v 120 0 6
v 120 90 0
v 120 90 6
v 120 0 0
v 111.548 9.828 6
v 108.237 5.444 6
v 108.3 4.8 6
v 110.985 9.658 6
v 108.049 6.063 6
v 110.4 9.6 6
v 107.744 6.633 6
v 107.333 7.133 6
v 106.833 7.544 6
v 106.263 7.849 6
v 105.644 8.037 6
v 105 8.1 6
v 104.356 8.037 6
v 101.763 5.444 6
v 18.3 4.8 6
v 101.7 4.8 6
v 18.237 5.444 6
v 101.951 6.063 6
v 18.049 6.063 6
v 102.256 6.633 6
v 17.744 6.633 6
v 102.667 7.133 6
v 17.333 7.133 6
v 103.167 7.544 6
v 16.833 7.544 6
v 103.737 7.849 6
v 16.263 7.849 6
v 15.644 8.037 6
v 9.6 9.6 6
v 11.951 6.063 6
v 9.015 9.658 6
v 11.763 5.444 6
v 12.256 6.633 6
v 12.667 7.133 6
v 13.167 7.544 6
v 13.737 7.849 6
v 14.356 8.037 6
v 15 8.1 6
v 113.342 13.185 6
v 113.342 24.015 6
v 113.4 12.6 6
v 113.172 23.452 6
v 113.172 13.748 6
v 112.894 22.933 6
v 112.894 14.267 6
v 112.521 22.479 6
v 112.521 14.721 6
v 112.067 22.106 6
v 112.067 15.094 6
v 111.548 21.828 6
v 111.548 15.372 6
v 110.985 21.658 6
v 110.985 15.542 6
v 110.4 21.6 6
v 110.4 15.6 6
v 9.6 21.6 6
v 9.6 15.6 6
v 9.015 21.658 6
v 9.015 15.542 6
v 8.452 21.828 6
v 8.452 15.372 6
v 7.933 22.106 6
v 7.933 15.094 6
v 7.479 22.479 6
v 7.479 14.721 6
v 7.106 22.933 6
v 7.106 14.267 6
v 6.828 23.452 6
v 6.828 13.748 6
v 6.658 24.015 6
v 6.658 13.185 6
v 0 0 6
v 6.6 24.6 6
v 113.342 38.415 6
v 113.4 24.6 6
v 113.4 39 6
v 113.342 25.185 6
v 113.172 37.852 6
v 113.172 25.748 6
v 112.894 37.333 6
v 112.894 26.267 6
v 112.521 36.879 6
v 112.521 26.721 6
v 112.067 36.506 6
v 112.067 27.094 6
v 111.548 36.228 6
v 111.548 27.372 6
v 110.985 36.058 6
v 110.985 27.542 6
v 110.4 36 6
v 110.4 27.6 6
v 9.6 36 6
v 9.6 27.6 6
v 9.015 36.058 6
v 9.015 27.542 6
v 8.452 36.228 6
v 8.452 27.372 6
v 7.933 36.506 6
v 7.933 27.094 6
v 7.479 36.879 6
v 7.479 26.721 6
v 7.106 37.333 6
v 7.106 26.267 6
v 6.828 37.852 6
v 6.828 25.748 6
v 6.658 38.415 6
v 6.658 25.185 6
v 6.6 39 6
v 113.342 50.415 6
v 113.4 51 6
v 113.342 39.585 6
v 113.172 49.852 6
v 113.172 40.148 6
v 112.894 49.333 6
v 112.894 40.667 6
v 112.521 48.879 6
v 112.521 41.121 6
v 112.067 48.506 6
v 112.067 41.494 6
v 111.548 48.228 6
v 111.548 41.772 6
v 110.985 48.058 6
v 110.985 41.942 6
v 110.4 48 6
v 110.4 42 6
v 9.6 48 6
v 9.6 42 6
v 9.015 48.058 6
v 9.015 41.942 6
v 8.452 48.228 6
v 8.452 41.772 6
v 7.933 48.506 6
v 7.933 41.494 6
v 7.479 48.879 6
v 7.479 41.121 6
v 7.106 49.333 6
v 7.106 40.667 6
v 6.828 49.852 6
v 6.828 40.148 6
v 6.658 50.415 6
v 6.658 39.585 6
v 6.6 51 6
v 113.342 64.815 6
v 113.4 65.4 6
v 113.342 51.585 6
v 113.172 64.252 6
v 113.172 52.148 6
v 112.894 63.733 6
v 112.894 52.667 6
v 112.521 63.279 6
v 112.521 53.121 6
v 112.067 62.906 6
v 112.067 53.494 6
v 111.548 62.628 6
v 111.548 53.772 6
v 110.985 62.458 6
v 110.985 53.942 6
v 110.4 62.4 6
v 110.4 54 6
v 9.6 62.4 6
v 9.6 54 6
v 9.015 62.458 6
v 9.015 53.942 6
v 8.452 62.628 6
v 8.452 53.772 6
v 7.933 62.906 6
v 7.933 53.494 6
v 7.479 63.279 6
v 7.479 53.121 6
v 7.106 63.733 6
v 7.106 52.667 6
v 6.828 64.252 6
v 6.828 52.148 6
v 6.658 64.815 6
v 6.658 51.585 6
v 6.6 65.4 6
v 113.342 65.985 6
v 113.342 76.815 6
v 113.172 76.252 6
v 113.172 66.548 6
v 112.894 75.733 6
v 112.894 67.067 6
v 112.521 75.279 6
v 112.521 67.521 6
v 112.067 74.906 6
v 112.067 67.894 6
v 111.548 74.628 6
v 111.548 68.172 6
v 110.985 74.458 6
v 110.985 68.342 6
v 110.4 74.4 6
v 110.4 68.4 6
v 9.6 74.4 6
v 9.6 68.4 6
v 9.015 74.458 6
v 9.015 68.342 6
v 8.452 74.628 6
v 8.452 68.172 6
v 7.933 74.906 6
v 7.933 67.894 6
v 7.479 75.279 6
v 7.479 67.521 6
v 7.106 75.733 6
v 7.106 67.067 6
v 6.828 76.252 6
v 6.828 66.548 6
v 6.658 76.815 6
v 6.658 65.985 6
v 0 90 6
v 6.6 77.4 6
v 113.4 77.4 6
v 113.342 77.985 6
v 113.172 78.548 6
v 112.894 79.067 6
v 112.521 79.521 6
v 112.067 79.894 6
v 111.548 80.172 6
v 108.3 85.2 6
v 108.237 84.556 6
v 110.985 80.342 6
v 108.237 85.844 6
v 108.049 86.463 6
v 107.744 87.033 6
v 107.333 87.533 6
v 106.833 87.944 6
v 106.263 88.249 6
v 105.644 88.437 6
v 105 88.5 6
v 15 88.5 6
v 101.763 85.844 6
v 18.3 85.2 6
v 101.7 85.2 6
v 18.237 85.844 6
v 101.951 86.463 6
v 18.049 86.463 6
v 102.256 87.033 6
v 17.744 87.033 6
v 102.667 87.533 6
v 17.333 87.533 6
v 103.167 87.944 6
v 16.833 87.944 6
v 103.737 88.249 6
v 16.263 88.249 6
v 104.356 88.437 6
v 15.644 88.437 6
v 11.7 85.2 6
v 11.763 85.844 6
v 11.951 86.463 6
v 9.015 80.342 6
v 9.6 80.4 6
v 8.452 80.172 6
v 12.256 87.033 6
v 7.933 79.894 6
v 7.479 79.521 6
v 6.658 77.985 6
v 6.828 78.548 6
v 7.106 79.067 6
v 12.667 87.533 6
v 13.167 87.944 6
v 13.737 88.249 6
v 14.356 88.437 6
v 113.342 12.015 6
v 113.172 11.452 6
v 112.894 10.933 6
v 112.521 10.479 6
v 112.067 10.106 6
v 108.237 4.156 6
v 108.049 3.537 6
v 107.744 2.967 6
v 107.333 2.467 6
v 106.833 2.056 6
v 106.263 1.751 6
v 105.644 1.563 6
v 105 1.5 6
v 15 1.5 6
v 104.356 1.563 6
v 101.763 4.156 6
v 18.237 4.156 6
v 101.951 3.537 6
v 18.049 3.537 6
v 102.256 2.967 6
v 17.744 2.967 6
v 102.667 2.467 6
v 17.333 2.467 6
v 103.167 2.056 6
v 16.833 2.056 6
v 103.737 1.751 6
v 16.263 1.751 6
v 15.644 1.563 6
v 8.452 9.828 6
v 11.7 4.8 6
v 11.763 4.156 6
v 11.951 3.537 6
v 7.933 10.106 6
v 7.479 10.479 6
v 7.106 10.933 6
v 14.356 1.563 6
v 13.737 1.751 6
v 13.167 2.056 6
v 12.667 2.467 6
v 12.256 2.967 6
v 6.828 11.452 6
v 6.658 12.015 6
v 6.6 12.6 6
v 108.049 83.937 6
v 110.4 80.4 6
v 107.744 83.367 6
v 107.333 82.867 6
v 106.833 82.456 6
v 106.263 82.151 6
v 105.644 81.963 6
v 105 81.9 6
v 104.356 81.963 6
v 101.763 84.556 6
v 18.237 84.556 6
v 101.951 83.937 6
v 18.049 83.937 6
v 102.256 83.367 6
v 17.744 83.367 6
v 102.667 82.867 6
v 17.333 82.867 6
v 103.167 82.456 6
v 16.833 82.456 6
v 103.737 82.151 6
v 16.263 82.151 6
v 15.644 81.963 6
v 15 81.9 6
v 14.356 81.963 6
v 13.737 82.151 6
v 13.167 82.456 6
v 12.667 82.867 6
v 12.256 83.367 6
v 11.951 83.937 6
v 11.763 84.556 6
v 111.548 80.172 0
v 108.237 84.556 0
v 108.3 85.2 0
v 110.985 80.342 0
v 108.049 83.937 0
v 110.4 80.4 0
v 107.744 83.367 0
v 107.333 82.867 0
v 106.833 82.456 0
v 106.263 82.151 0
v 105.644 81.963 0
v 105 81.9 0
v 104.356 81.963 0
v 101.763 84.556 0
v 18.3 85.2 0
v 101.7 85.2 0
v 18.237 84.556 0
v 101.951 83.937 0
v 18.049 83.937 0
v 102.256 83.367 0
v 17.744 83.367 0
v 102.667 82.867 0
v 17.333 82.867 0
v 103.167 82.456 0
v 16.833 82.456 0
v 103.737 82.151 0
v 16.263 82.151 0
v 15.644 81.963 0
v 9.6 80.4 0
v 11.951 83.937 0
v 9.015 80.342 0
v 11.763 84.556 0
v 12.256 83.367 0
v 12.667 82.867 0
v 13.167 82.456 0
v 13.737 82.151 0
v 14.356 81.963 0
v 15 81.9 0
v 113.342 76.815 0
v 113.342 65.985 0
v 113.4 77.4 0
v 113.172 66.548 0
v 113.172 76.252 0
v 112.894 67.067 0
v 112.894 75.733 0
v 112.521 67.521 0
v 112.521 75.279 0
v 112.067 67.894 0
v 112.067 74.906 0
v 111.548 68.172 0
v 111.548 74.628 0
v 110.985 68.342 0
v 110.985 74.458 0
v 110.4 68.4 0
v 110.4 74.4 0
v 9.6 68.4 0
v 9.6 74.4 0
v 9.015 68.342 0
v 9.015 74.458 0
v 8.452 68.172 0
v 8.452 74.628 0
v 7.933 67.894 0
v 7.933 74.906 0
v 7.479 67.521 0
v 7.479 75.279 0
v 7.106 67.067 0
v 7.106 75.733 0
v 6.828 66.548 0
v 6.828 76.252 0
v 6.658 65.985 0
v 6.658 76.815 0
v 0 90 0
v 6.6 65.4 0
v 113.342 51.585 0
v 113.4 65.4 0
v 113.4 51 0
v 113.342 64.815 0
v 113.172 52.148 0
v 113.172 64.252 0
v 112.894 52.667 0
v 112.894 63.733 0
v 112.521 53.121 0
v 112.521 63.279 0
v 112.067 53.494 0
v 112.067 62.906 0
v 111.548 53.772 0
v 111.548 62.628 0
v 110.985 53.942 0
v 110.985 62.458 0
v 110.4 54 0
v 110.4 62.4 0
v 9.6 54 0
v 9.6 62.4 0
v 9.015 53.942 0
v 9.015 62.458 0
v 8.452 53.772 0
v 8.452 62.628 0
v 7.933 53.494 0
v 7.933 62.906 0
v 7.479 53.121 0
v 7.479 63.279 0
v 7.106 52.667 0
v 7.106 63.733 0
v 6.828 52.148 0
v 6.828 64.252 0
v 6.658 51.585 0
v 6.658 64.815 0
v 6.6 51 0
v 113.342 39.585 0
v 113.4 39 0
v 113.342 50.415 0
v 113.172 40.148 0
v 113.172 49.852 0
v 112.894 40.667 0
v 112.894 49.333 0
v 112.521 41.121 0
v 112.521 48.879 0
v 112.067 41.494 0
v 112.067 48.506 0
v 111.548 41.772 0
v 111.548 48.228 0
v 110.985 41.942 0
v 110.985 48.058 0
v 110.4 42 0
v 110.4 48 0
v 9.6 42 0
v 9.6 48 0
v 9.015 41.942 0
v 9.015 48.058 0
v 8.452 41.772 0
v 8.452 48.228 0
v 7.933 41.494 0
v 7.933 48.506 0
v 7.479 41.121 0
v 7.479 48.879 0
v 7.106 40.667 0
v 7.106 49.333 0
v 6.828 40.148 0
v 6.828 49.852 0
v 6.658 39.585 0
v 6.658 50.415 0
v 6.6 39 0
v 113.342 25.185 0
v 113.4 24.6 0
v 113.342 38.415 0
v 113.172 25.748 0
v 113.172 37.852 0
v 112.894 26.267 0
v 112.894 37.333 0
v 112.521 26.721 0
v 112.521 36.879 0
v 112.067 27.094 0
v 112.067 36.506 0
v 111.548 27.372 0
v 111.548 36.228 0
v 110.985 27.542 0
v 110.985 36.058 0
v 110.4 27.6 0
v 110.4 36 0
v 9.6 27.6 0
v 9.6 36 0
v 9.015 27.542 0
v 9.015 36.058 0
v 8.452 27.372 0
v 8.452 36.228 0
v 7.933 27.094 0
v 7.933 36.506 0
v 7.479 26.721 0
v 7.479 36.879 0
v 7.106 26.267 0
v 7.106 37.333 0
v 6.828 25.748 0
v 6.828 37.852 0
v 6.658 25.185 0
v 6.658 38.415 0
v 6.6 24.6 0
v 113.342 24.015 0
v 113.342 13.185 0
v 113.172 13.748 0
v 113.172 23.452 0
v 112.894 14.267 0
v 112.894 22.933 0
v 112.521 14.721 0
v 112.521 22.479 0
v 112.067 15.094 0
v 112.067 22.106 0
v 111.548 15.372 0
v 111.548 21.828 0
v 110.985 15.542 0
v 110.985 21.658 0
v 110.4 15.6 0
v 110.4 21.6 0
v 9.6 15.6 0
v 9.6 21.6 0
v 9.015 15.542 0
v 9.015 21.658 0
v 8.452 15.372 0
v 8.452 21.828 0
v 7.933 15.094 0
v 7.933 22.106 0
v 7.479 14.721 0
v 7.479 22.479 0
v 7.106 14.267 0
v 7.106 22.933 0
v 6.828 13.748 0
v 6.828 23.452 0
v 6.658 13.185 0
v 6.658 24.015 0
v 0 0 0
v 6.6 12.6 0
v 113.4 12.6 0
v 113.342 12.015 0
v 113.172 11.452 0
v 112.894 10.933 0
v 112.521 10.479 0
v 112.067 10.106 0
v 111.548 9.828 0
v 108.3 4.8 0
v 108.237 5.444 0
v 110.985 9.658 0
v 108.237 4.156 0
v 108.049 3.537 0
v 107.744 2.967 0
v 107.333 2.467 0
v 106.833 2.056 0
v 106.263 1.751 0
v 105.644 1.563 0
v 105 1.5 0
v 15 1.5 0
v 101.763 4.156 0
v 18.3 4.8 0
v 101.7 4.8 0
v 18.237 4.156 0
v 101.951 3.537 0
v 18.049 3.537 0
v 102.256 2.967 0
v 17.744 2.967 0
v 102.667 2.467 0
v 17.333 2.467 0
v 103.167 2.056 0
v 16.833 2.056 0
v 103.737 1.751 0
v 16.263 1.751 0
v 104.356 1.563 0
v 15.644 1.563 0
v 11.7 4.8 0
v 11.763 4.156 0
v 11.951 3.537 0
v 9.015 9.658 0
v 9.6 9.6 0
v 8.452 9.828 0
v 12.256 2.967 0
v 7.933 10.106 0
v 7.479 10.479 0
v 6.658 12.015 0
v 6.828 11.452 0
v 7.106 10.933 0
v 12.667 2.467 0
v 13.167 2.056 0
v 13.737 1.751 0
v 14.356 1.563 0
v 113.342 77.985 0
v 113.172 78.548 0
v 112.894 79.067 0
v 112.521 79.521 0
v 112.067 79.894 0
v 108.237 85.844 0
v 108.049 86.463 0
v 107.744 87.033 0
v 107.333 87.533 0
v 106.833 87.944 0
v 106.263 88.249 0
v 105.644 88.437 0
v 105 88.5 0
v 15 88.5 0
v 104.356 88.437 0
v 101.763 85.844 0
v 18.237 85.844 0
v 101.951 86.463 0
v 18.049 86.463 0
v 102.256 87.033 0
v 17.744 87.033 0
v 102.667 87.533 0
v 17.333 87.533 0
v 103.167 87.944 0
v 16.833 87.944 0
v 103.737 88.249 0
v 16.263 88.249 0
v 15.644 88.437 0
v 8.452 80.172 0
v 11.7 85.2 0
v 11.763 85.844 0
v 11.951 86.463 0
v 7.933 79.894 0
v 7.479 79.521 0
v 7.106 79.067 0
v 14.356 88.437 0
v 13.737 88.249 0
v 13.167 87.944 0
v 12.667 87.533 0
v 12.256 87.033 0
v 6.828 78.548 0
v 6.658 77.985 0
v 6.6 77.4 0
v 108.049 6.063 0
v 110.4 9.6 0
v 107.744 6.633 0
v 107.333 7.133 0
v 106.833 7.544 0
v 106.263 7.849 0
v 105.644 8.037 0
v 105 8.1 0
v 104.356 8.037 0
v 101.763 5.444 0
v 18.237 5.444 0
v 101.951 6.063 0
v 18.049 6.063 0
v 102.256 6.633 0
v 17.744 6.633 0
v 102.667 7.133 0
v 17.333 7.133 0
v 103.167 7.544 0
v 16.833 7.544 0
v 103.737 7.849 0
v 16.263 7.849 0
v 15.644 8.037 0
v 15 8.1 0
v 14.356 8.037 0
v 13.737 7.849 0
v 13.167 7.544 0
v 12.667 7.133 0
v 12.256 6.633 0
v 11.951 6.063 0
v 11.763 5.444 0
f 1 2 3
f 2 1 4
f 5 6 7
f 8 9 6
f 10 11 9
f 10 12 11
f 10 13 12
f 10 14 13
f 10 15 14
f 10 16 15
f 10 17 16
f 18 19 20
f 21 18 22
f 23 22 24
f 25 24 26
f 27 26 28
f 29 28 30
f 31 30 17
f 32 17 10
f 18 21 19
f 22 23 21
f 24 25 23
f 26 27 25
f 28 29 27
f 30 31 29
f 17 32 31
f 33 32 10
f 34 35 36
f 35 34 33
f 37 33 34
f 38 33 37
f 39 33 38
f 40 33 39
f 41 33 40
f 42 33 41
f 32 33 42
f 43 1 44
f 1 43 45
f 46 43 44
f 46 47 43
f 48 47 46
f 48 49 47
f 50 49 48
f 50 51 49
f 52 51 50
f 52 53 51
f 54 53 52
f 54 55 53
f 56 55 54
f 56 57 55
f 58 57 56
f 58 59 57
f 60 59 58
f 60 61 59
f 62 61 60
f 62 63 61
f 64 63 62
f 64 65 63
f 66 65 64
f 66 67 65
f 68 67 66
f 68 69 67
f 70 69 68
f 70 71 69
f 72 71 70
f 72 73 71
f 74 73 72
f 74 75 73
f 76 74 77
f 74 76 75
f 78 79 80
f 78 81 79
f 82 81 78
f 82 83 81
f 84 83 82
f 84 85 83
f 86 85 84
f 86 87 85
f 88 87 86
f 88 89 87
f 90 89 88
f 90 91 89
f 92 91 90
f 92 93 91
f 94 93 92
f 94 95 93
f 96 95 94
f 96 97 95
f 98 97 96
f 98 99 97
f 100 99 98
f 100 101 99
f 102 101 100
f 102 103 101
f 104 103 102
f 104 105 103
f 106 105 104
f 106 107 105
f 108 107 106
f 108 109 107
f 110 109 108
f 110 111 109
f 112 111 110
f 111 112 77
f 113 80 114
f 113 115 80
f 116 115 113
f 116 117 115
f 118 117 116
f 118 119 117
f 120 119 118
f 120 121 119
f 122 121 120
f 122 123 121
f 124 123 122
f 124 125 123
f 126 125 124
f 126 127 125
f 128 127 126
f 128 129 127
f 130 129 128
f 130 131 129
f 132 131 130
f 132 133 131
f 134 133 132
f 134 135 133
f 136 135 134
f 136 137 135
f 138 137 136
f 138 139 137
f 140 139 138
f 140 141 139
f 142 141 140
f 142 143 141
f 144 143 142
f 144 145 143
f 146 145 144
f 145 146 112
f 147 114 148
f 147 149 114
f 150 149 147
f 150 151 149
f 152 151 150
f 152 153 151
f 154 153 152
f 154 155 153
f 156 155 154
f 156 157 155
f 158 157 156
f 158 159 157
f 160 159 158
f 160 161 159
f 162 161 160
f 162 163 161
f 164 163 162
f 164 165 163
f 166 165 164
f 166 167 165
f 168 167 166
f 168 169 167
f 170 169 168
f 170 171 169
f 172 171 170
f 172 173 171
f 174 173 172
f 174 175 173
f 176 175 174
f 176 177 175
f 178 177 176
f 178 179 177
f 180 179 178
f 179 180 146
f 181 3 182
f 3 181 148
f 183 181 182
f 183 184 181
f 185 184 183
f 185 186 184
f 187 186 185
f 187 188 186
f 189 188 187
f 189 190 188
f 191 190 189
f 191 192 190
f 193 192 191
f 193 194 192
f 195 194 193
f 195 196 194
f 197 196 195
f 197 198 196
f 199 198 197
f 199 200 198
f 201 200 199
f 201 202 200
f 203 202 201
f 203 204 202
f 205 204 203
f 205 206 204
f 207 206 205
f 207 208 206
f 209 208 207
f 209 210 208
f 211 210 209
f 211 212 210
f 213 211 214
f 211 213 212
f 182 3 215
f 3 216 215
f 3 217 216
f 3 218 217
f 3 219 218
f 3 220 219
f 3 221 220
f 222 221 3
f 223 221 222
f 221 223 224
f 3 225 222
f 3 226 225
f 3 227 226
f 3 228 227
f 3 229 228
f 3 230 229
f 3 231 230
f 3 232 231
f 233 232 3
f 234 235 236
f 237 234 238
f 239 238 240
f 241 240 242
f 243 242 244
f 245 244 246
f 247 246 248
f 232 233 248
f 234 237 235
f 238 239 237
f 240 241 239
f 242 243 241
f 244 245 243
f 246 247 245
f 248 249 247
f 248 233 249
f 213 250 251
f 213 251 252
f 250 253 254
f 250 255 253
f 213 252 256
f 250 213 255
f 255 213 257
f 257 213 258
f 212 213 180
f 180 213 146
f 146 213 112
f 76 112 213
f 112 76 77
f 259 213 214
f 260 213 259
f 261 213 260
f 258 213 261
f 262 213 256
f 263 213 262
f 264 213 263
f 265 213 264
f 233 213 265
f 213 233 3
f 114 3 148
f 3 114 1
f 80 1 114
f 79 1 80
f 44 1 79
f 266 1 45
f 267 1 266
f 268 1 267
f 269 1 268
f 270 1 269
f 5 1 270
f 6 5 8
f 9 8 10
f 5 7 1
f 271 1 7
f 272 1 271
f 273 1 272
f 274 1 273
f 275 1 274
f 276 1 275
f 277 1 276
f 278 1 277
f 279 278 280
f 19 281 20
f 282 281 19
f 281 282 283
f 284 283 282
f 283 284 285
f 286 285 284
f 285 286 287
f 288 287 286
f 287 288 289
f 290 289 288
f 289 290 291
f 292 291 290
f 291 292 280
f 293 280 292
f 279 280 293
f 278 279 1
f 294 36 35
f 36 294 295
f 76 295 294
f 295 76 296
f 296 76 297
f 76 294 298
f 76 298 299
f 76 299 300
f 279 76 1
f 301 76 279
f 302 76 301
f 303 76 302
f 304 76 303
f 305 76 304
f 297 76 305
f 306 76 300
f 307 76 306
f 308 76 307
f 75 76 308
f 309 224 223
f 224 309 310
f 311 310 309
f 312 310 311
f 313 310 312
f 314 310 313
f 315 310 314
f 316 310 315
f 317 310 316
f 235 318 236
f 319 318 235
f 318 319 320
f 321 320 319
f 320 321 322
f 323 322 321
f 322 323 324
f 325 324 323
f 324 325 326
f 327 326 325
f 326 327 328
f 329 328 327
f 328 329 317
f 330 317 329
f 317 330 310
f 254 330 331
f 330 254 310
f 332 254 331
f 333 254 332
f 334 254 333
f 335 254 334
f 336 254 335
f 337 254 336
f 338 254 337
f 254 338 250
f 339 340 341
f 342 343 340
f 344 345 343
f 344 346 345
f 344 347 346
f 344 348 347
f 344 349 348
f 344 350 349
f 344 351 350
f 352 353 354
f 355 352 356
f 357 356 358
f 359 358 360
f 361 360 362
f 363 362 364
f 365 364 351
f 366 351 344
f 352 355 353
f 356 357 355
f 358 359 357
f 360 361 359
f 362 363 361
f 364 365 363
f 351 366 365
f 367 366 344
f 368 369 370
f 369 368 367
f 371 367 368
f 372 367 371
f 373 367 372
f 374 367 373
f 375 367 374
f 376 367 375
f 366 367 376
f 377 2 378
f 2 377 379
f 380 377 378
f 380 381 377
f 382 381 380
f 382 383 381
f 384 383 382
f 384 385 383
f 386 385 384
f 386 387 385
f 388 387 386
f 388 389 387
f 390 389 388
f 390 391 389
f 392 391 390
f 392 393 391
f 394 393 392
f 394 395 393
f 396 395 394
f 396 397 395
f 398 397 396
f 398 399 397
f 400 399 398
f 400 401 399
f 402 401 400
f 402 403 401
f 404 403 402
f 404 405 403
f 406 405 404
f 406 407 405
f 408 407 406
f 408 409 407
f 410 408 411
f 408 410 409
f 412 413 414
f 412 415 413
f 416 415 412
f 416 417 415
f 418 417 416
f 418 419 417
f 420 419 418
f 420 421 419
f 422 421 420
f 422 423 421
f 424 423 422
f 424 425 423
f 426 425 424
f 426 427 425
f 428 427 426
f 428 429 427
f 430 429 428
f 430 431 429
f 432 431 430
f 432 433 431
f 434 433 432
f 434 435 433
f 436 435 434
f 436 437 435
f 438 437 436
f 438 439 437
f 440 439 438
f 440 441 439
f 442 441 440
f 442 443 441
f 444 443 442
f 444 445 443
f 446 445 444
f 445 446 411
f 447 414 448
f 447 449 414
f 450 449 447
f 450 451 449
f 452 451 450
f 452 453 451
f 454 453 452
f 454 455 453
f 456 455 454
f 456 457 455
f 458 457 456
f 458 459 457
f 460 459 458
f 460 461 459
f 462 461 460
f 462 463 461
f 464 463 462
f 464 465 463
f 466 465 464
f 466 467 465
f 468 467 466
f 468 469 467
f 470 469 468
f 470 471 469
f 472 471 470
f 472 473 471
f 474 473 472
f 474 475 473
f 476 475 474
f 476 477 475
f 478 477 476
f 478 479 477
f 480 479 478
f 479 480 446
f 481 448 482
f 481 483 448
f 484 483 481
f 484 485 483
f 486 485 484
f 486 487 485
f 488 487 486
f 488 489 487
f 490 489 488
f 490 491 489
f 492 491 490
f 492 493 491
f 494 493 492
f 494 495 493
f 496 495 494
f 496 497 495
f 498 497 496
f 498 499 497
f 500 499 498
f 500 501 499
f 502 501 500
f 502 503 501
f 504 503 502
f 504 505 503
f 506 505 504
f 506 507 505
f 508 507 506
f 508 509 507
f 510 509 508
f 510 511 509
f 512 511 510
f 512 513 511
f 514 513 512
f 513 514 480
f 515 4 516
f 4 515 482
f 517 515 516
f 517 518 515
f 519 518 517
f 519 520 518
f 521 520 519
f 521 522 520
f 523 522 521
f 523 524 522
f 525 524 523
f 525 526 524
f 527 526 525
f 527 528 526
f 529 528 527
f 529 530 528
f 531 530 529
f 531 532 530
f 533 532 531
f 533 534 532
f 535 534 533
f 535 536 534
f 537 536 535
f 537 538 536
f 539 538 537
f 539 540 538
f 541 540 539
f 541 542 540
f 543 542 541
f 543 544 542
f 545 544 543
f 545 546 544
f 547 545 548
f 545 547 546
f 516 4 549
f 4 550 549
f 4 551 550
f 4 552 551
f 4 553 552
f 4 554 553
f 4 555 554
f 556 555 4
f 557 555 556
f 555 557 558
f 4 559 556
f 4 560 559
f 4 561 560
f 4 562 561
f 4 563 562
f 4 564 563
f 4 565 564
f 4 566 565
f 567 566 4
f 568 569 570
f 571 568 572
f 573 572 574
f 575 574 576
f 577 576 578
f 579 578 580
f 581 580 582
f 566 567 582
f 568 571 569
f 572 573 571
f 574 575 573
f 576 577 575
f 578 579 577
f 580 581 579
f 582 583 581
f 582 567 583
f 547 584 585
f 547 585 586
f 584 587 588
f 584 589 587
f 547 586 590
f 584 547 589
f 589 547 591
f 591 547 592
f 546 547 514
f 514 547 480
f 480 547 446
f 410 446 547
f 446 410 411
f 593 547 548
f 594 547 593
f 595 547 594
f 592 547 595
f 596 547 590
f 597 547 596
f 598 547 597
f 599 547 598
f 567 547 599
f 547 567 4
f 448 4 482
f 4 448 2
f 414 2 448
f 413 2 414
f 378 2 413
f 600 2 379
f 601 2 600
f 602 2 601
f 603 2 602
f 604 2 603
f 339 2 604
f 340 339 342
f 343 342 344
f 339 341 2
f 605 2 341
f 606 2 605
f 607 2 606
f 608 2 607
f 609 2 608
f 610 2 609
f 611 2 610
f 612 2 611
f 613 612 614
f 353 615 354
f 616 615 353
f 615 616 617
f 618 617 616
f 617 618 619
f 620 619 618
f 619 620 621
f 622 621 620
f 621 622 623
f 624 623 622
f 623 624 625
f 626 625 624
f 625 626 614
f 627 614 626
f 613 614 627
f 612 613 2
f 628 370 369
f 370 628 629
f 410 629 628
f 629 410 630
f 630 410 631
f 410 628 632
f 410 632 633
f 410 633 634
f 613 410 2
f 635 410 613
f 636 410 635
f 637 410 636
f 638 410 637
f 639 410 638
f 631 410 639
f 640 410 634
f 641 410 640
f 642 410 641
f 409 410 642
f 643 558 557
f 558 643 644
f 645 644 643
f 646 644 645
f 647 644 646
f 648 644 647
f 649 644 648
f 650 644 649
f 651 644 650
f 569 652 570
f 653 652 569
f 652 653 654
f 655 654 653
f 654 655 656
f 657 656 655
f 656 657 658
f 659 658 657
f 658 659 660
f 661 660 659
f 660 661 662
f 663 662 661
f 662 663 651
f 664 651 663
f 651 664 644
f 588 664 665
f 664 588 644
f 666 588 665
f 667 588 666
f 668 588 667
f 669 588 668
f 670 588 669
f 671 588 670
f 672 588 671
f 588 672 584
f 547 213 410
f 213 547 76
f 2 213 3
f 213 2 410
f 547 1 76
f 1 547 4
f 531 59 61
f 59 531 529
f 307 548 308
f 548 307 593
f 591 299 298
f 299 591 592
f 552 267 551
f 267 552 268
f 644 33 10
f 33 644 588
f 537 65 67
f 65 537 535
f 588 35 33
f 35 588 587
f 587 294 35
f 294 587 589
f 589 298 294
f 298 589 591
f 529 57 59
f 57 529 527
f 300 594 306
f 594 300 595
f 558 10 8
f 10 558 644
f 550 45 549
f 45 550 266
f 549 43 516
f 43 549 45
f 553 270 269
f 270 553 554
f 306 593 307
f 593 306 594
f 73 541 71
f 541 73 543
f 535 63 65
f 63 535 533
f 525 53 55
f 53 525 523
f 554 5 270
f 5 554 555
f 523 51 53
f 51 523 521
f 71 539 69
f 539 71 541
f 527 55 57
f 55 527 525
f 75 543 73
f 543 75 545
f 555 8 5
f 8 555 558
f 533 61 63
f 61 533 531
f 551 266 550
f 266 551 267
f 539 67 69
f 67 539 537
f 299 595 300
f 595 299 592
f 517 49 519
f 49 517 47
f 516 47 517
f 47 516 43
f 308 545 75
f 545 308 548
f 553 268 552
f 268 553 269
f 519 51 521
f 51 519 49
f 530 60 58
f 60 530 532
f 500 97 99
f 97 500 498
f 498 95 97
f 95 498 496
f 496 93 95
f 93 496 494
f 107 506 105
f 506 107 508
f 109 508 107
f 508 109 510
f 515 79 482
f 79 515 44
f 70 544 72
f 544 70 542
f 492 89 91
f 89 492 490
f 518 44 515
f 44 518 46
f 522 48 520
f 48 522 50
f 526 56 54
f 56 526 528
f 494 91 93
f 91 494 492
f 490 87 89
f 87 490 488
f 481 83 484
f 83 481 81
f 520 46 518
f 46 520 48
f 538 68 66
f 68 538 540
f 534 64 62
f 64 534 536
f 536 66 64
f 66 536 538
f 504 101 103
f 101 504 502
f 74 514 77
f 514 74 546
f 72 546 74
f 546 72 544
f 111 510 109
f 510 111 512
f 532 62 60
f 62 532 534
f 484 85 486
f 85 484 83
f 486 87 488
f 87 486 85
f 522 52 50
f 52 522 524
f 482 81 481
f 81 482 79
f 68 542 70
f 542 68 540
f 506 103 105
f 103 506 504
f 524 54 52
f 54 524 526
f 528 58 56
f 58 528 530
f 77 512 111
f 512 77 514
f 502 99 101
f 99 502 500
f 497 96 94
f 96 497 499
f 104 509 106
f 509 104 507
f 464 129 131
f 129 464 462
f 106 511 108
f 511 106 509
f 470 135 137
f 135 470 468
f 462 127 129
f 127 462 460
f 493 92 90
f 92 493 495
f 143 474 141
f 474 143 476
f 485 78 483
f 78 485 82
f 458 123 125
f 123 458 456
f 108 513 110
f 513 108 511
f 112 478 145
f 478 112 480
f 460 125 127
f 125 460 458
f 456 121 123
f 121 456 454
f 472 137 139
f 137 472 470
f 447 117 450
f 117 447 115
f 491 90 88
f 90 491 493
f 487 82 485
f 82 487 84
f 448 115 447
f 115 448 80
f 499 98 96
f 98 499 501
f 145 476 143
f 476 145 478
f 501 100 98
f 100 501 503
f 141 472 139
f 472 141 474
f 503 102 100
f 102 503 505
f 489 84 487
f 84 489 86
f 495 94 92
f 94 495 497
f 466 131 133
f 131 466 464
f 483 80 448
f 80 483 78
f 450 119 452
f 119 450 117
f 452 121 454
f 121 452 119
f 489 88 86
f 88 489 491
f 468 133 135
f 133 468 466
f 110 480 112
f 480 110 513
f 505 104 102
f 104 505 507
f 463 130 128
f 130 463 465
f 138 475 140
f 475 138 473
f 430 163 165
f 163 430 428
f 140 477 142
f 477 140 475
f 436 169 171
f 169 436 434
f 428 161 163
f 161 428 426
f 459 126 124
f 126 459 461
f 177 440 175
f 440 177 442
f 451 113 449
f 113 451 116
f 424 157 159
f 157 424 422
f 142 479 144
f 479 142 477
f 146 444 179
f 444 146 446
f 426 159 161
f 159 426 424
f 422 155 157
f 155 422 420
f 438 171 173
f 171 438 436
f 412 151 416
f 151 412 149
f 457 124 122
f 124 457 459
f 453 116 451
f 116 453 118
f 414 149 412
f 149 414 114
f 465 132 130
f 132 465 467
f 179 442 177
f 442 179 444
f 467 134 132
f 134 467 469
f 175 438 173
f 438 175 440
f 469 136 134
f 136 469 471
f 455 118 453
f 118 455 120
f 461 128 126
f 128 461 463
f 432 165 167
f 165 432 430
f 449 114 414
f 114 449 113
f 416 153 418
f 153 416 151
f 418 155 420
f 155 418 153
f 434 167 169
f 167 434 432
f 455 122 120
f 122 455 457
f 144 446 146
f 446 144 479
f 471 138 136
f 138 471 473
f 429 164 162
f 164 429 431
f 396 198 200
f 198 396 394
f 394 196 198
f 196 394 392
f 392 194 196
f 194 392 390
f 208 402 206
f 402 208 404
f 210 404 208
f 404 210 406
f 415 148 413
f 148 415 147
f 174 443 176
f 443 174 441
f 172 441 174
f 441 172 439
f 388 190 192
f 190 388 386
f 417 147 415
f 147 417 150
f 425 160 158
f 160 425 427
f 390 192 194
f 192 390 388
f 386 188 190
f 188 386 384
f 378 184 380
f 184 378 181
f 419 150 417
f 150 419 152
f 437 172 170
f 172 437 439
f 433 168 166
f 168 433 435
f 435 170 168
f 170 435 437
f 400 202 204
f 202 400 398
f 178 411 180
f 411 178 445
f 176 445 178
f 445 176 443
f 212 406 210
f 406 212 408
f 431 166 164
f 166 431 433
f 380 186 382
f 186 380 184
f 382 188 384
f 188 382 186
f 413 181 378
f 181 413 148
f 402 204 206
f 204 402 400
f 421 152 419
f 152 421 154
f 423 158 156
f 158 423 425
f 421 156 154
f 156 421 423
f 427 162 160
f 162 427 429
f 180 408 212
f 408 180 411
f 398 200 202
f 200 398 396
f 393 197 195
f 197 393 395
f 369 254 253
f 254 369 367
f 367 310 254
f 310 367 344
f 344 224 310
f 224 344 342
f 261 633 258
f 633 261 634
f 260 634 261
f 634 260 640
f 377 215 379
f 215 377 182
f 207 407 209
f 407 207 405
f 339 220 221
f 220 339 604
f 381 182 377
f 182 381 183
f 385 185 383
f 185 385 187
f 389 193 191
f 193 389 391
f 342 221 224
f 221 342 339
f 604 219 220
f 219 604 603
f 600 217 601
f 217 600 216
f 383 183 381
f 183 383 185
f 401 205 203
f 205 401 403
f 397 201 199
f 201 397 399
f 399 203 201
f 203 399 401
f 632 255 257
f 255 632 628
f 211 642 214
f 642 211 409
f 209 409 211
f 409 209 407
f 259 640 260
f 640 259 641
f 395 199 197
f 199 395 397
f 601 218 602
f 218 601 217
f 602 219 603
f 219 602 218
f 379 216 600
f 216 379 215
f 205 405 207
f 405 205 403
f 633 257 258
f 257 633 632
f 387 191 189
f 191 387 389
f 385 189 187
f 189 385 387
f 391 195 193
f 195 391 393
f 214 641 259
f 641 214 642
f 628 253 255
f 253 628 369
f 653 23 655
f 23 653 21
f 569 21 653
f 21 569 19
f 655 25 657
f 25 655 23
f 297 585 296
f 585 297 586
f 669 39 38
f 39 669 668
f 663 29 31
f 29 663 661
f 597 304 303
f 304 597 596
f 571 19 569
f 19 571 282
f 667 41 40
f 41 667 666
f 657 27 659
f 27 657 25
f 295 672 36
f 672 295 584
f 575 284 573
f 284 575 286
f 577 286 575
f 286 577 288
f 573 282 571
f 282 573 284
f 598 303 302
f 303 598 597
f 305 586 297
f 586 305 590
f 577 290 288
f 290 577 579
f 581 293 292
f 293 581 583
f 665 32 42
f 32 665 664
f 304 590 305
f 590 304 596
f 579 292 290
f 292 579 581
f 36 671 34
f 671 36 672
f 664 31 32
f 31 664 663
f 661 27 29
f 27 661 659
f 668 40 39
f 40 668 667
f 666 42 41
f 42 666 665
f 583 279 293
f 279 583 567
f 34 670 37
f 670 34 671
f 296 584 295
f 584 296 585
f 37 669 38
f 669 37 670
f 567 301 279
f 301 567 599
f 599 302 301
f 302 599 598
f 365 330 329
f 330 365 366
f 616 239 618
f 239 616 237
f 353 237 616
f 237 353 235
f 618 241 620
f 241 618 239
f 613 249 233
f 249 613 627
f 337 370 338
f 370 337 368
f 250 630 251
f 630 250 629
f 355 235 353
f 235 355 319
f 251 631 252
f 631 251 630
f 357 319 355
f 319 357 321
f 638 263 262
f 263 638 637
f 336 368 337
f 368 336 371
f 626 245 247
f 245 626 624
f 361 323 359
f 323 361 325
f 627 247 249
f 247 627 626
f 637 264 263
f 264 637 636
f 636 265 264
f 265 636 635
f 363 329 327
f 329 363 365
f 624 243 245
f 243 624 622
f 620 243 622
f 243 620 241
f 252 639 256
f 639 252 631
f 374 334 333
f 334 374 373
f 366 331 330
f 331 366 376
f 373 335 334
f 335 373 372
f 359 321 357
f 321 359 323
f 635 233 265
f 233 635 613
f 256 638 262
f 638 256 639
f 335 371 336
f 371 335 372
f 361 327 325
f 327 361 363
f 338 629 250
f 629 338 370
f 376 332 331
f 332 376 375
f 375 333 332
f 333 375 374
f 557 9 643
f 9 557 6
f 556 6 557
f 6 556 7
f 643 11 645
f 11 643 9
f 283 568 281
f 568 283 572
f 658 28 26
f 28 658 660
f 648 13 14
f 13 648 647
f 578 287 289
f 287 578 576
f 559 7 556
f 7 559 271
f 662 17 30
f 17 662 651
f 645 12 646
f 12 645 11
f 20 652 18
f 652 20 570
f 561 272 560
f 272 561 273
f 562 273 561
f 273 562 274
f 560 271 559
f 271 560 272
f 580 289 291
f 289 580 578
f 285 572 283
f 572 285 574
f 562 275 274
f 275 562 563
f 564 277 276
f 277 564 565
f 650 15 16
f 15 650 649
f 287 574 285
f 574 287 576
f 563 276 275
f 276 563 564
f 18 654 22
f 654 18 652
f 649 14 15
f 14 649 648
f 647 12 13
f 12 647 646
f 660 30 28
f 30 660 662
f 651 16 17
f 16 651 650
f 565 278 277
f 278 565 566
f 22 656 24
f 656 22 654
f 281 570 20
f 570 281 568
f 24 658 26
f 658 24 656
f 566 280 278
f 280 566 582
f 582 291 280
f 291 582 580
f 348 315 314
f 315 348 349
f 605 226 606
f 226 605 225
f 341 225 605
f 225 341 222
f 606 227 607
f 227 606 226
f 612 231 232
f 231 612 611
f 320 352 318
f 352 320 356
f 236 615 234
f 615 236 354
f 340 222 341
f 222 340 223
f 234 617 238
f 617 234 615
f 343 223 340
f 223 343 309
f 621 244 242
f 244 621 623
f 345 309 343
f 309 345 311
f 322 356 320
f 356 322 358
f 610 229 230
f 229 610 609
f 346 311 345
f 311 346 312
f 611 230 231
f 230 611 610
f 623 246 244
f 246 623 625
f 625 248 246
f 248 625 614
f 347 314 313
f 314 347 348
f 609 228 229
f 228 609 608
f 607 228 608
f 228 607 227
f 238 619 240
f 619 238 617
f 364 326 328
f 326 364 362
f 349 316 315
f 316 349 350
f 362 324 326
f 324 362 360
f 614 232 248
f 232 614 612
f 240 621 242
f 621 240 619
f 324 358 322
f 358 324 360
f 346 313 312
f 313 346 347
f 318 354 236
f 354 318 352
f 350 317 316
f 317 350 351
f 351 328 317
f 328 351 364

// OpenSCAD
$fn = 32;

// ----------------------------------------------------------------------
// Slotted panel: 120 x 90 mm, 6 рядов of slots
// ----------------------------------------------------------------------

// --- parameters (mm) ---
panel_w = 120;            // panel width
panel_d = 90;             // panel depth
thick = 6;                // panel thickness
slot_w = 6;               // slot width
pitch0 = 12;              // first row pitch
pitch_step = 2.4;         // pitch increase per row
margin = 9.6;             // margin around the slot field
rows = 6;                 // number of slot rows
mount_d = 6.6;            // mounting holes
mount_x = 45;             // mounting hole offset

difference() {
  union() {
    cube([panel_w, panel_d, thick]);
  }
  /* slot rows: stadium shaped cutters, 2.5 mm clear of both faces */
  /* row 0: pitch 12, length 100.8 */
  hull() {
    translate([9.6, 12.6, -2.5]) cylinder(h = thick + 5, d = slot_w);
    translate([110.4, 12.6, -2.5]) cylinder(h = thick + 5, d = slot_w);
  }
  /* row 1: pitch 14.4, length 100.8 */
  hull() {
    translate([9.6, 24.6, -2.5]) cylinder(h = thick + 5, d = slot_w);
    translate([110.4, 24.6, -2.5]) cylinder(h = thick + 5, d = slot_w);
  }
  /* row 2: pitch 12, length 100.8 */
  hull() {
    translate([9.6, 39, -2.5]) cylinder(h = thick + 5, d = slot_w);
    translate([110.4, 39, -2.5]) cylinder(h = thick + 5, d = slot_w);
  }
  /* row 3: pitch 14.4, length 100.8 */
  hull() {
    translate([9.6, 51, -2.5]) cylinder(h = thick + 5, d = slot_w);
    translate([110.4, 51, -2.5]) cylinder(h = thick + 5, d = slot_w);
  }
  /* row 4: pitch 12, length 100.8 */
  hull() {
    translate([9.6, 65.4, -2.5]) cylinder(h = thick + 5, d = slot_w);
    translate([110.4, 65.4, -2.5]) cylinder(h = thick + 5, d = slot_w);
  }
  /* row 5: pitch 14.4, length 100.8 */
  hull() {
    translate([9.6, 77.4, -2.5]) cylinder(h = thick + 5, d = slot_w);
    translate([110.4, 77.4, -2.5]) cylinder(h = thick + 5, d = slot_w);
  }
  translate([15, 4.8, -2.5]) cylinder(h = 11, d = mount_d);
  translate([15, 85.2, -2.5]) cylinder(h = 11, d = mount_d);
  translate([105, 4.8, -2.5]) cylinder(h = 11, d = mount_d);
  translate([105, 85.2, -2.5]) cylinder(h = 11, d = mount_d);
}
